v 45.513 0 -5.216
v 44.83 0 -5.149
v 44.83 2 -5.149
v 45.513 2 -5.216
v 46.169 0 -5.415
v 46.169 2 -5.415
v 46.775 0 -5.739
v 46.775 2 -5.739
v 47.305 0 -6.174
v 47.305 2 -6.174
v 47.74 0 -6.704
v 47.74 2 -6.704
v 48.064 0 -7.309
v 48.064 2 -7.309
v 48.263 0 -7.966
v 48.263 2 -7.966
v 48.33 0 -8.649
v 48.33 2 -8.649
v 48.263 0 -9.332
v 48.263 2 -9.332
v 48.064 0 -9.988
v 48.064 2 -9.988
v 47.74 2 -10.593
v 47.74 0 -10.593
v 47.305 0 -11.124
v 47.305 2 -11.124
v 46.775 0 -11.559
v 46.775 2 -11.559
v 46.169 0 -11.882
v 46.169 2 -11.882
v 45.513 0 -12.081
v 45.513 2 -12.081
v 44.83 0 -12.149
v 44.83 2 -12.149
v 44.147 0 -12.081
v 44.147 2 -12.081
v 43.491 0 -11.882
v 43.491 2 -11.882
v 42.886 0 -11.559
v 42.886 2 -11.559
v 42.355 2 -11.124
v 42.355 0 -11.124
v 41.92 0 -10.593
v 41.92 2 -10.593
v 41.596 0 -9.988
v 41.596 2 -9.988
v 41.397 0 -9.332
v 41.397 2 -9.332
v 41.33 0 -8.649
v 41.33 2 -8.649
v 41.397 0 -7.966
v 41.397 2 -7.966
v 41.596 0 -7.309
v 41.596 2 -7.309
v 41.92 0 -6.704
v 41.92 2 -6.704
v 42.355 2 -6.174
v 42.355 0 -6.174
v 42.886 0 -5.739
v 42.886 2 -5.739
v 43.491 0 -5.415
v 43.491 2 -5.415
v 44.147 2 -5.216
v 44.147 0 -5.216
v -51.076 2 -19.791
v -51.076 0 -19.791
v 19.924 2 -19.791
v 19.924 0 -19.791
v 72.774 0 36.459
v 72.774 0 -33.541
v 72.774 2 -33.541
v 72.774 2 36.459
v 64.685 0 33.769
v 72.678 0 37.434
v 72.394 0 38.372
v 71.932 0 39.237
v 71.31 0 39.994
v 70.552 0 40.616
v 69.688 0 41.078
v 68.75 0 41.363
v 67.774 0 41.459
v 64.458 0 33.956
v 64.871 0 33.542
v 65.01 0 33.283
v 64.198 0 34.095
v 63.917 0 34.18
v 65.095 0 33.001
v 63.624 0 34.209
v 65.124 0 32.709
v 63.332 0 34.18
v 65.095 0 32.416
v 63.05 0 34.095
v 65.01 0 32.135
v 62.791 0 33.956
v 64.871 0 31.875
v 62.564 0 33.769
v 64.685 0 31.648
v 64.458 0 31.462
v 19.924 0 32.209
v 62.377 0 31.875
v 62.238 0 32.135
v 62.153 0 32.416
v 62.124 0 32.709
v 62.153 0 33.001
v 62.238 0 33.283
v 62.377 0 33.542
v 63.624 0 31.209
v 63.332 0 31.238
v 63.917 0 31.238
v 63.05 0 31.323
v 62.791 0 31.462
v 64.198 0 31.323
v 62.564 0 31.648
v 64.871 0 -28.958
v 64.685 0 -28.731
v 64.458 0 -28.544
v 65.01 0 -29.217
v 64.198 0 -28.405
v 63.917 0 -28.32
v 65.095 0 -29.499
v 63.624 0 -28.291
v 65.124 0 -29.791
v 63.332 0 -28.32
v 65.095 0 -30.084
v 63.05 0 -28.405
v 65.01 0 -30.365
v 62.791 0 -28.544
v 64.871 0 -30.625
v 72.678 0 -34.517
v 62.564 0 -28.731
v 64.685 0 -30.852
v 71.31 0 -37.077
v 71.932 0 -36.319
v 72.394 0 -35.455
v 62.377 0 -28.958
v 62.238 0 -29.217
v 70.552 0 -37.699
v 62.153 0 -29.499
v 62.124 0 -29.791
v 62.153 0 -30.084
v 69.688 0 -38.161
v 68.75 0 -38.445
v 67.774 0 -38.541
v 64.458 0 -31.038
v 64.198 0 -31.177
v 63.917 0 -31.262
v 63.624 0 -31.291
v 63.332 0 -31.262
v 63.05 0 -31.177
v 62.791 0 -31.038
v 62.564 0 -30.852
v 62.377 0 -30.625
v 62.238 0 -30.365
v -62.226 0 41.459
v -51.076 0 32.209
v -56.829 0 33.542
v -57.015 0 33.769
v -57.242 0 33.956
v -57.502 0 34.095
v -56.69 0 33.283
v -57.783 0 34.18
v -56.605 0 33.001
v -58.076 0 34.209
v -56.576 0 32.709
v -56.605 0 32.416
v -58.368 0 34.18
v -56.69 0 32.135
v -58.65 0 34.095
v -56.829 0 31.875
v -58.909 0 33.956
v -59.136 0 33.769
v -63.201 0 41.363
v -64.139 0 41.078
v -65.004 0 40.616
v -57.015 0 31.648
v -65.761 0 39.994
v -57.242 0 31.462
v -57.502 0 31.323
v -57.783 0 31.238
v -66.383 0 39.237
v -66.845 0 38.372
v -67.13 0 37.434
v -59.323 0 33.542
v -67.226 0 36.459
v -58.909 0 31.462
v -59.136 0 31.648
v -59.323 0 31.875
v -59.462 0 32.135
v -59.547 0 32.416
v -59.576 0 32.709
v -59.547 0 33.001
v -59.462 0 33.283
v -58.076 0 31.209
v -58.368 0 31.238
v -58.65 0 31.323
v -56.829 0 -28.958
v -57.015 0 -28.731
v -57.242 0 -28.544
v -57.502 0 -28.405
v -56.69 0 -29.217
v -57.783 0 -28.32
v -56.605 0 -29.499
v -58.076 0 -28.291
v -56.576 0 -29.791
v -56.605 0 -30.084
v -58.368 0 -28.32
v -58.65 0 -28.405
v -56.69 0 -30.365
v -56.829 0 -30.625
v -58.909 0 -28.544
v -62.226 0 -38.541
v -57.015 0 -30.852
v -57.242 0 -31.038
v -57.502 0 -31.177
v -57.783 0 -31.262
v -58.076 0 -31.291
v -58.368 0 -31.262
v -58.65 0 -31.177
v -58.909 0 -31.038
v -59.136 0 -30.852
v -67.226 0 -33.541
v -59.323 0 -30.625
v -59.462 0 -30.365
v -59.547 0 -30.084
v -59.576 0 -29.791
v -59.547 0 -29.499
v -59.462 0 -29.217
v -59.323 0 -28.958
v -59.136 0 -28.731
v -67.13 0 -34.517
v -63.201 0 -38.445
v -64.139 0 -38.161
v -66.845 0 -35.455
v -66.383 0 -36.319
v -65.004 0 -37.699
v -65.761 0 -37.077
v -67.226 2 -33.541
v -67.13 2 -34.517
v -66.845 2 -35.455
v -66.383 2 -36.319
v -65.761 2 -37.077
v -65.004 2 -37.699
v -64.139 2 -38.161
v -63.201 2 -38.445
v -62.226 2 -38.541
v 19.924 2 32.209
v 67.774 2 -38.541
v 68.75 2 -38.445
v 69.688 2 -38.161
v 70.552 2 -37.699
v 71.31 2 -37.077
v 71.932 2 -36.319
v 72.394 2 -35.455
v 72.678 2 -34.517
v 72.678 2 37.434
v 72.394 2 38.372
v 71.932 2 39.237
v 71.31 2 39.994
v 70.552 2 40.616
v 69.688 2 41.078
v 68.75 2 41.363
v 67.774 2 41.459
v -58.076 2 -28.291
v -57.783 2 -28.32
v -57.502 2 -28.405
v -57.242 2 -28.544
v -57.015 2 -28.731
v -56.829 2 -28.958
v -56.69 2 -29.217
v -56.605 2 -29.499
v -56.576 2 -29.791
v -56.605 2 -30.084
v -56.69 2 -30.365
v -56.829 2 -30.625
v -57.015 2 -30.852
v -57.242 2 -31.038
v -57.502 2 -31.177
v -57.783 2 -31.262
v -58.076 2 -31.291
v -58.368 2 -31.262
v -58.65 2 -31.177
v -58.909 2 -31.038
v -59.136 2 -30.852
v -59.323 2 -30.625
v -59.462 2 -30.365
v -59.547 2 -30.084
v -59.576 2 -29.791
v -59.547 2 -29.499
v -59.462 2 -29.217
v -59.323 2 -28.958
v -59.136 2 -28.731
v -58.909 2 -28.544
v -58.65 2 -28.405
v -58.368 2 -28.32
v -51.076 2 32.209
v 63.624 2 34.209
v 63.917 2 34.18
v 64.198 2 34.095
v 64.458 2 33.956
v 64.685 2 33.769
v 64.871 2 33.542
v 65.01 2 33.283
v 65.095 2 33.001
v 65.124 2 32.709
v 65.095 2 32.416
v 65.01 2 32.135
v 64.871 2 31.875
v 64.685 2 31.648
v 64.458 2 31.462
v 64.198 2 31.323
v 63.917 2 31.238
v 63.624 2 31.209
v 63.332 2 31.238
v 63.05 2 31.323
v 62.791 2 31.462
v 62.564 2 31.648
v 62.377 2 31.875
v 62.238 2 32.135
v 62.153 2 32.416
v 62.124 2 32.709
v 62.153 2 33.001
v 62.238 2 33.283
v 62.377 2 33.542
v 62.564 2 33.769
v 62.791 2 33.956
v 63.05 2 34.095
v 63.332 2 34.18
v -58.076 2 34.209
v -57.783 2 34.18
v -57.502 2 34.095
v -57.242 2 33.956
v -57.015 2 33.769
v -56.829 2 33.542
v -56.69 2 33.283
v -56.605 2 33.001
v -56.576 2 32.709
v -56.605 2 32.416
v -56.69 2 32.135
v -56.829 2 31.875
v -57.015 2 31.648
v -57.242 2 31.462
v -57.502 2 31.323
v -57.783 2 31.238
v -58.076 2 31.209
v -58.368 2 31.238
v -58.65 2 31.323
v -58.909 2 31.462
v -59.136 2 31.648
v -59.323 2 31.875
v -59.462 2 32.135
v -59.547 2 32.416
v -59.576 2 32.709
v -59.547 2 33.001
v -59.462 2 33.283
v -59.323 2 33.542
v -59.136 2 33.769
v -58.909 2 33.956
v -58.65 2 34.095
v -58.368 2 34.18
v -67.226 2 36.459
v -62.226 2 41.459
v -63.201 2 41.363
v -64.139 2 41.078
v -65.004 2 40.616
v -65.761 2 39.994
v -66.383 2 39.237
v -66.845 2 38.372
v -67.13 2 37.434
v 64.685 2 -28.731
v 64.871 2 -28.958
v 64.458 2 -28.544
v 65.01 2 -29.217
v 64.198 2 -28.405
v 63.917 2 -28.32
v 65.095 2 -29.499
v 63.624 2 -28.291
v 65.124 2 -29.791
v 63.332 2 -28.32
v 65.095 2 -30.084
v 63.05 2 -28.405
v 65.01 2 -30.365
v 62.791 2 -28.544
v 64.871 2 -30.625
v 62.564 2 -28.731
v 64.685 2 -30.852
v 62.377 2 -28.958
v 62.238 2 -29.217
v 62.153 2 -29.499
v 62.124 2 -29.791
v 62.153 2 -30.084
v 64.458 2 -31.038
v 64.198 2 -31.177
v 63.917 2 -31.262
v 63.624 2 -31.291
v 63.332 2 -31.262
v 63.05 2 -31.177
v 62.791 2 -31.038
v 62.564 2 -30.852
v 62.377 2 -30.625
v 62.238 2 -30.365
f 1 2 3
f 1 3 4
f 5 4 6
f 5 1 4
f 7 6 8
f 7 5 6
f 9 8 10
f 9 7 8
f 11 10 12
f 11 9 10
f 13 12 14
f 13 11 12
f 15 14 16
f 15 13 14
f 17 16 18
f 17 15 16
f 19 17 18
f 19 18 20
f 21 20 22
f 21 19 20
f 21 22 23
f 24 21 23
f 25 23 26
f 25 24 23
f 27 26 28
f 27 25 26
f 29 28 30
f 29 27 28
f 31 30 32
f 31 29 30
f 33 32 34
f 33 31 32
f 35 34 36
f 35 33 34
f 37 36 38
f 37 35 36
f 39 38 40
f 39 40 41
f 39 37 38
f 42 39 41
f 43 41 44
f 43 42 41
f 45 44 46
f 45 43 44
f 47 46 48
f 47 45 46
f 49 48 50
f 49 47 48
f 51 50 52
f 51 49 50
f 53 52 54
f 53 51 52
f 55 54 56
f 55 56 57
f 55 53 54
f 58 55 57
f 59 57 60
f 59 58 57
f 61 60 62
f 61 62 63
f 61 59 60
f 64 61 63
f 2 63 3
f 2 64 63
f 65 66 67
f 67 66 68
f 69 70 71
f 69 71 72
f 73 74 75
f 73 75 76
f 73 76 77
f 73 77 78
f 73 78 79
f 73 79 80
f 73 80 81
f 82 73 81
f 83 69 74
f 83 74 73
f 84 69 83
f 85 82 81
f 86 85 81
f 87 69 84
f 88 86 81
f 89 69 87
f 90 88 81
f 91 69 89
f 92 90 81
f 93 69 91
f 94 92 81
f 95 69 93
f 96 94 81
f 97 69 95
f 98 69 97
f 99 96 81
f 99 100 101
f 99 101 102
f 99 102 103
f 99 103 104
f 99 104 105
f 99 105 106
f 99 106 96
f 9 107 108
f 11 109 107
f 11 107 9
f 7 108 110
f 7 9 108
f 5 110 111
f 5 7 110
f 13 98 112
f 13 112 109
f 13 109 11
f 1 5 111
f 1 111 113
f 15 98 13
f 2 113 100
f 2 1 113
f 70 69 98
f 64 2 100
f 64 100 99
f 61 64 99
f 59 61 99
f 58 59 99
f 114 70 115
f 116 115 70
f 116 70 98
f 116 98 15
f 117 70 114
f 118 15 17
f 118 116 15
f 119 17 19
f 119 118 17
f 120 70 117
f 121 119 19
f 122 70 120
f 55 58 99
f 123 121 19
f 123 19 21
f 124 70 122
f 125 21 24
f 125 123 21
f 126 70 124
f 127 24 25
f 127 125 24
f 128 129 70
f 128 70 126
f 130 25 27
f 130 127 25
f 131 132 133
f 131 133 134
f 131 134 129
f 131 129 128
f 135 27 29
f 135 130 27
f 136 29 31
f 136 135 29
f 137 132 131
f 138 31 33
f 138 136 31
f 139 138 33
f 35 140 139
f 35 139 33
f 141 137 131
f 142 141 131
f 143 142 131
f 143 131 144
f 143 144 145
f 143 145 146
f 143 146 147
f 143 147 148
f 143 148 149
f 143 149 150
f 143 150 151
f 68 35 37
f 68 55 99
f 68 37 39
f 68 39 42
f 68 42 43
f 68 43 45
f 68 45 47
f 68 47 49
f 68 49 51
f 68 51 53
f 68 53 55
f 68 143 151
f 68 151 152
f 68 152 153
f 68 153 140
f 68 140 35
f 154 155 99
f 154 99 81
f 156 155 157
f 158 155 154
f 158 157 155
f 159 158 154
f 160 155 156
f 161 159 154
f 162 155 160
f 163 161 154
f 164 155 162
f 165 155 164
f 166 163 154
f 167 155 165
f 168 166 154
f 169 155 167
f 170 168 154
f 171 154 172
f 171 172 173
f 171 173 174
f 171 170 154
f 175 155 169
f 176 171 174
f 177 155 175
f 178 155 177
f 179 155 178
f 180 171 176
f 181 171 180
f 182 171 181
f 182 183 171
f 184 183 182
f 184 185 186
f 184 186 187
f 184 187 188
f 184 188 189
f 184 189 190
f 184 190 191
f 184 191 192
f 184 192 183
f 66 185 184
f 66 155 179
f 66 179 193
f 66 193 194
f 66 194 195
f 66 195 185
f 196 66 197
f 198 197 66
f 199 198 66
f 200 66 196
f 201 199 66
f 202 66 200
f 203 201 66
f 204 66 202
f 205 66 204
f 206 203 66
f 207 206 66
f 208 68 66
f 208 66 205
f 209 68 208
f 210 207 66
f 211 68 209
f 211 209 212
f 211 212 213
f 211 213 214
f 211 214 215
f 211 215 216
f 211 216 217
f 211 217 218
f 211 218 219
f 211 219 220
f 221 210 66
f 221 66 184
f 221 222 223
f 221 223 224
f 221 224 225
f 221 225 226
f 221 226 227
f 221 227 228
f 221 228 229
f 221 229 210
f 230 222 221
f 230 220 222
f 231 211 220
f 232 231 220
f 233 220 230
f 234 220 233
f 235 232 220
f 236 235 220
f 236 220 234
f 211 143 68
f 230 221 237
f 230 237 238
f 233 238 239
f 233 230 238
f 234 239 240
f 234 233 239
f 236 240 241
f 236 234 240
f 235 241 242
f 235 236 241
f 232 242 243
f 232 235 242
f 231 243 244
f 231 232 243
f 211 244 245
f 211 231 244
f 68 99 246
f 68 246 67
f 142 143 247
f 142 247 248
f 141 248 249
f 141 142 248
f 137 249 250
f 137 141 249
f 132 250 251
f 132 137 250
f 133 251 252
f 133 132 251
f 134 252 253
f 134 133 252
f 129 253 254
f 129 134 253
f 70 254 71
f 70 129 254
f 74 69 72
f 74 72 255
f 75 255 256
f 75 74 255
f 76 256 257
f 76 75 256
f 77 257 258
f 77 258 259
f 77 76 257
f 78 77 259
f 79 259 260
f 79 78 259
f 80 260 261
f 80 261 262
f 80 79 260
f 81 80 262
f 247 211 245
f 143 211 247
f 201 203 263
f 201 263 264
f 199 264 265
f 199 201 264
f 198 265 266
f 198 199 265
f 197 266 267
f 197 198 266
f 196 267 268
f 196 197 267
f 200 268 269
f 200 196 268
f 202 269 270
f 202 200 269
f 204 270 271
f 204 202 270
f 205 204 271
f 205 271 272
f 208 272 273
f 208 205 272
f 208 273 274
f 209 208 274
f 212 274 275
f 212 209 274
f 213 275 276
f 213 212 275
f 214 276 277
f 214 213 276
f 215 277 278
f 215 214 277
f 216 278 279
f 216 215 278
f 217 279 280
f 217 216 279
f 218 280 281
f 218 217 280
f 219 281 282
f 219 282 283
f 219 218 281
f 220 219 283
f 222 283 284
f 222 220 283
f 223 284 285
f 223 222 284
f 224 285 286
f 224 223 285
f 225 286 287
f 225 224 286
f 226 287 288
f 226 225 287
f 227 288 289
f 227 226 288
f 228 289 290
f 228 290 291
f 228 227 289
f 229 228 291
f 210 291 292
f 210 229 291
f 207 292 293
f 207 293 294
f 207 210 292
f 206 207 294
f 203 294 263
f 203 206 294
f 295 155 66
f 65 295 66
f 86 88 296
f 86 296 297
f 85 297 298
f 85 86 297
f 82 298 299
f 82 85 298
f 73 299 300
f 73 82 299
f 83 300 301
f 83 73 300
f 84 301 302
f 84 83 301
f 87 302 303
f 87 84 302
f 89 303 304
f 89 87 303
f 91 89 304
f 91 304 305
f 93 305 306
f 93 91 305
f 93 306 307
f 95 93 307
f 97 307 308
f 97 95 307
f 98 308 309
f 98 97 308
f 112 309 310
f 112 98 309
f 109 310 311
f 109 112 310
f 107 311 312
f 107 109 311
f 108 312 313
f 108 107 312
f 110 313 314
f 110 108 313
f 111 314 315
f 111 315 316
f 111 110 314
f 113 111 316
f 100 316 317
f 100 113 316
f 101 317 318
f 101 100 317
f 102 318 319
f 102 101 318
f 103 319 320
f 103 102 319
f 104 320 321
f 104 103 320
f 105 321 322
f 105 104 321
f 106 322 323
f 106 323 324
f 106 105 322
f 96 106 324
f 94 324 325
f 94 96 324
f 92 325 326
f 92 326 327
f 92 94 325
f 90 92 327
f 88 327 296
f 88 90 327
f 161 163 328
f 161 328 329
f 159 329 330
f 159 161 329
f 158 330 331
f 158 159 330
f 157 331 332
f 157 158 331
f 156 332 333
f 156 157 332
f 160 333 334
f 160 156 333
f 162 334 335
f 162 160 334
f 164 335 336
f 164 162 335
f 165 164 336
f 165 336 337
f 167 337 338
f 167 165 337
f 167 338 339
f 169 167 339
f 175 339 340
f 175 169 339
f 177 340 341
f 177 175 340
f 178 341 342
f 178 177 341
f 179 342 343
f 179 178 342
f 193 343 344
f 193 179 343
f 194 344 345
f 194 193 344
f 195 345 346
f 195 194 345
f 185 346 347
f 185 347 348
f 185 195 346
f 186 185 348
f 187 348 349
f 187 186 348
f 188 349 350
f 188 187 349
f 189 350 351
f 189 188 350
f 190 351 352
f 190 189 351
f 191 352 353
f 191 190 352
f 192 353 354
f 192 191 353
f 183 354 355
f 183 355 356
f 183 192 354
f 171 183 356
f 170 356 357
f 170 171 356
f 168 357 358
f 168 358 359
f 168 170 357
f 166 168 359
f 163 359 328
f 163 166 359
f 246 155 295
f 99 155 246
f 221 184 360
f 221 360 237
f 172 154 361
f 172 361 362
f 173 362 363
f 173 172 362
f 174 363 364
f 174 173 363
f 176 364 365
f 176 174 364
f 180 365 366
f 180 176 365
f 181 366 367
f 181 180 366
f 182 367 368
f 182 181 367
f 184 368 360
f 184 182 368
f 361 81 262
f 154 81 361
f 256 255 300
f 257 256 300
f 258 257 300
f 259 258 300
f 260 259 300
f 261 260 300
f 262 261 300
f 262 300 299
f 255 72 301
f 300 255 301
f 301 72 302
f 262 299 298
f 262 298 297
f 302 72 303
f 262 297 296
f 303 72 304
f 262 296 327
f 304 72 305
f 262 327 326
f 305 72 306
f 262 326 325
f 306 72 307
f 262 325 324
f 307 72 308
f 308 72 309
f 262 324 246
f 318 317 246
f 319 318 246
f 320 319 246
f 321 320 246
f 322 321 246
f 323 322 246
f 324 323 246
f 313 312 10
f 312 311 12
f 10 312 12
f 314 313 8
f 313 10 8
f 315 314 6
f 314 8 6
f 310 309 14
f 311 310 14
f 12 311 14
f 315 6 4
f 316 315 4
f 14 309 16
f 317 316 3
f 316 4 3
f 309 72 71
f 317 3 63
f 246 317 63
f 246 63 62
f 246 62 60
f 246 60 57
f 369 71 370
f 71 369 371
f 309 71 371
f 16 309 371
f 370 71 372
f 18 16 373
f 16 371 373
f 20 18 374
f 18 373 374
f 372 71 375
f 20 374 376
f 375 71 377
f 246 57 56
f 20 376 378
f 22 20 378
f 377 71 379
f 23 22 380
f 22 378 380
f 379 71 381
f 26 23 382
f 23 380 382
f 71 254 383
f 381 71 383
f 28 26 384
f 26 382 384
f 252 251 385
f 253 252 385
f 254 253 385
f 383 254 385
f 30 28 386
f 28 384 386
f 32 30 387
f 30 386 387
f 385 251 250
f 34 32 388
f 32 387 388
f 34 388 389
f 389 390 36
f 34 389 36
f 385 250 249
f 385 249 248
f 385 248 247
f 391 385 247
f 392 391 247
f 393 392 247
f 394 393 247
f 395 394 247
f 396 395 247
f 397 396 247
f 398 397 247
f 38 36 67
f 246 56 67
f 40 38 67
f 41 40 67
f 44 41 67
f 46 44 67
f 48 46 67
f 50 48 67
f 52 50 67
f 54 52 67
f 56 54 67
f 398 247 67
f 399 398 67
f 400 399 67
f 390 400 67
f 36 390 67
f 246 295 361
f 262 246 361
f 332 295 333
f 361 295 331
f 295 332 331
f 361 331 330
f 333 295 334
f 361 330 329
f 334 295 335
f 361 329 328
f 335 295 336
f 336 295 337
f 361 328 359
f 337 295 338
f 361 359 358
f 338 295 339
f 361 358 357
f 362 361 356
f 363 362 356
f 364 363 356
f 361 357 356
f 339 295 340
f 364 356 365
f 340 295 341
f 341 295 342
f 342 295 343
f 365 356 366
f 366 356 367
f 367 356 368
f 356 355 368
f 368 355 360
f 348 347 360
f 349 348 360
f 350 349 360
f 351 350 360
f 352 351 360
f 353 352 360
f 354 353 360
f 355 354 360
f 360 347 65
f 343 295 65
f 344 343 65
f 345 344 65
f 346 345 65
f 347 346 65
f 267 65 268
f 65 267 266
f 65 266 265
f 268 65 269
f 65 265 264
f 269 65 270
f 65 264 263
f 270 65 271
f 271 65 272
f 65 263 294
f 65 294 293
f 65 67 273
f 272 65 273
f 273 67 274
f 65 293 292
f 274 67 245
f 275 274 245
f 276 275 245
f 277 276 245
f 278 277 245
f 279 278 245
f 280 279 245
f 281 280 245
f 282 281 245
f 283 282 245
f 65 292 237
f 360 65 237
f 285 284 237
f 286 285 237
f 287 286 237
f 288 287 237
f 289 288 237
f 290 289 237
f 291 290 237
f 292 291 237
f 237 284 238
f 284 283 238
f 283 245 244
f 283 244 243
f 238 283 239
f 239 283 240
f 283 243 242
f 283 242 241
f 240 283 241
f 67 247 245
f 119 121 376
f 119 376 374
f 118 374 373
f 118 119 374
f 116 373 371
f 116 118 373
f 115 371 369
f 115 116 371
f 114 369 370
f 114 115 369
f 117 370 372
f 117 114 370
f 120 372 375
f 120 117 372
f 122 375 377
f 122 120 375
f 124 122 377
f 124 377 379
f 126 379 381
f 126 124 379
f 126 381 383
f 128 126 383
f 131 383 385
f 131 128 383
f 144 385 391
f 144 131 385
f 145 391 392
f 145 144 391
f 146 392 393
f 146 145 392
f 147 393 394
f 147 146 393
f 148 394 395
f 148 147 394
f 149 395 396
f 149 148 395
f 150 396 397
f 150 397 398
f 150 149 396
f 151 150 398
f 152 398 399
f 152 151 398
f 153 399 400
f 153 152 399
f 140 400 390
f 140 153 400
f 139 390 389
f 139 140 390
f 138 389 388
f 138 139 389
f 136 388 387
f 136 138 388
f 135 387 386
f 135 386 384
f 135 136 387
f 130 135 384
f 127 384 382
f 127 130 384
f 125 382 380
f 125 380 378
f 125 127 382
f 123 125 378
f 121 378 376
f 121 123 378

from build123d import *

# Parameters (mm, degrees)
SKETCH2_R           = 1.5
SKETCH2_R_2         = 3.5
SKETCH2_W           = 71
SKETCH2_H           = 52
BOSS_EXTRUDE1_DEPTH = 2


with BuildPart() as part:
    # Sketch2 → Boss-Extrude1 (new body)
    with BuildSketch(Plane(origin=(0, 0, 0), x_dir=(1, 0, 0), z_dir=(0, 1, 0))):
        with BuildLine():
            Line((-62.225750218, 38.541254469), (67.774249782, 38.541254469))
            ThreePointArc((67.774249782, 38.541254469), (71.309783688, 37.076788375), (72.774249782, 33.541254469))
            Line((72.774249782, 33.541254469), (72.774249782, -36.458745531))
            ThreePointArc((72.774249782, -36.458745531), (71.309783688, -39.994279437), (67.774249782, -41.458745531))
            Line((67.774249782, -41.458745531), (-62.225750218, -41.458745531))
            ThreePointArc((-62.225750218, -41.458745531), (-65.761284124, -39.994279437), (-67.225750218, -36.458745531))
            Line((-67.225750218, -36.458745531), (-67.225750218, 33.541254469))
            ThreePointArc((-67.225750218, 33.541254469), (-65.761284124, 37.076788375), (-62.225750218, 38.541254469))
        make_face()
        with Locations(Location((-58.075750218, 29.791254469, 0), (0, 0, 270))):
            Circle(SKETCH2_R, mode=Mode.SUBTRACT)
        with Locations(Location((63.624249782, 29.791254469, 0), (0, 0, 270))):
            Circle(SKETCH2_R, mode=Mode.SUBTRACT)
        with Locations(Location((-58.075750218, -32.708745531, 0), (0, 0, 270))):
            Circle(SKETCH2_R, mode=Mode.SUBTRACT)
        with Locations(Location((63.624249782, -32.708745531, 0), (0, 0, 270))):
            Circle(SKETCH2_R, mode=Mode.SUBTRACT)
        with Locations(Location((44.830013856, 8.6487321, 0), (0, 0, 270))):
            Circle(SKETCH2_R_2, mode=Mode.SUBTRACT)
        with Locations((-15.575750218, -6.208745531)):
            Rectangle(SKETCH2_W, SKETCH2_H, mode=Mode.SUBTRACT)
    extrude(amount=BOSS_EXTRUDE1_DEPTH)


solid = part.part
